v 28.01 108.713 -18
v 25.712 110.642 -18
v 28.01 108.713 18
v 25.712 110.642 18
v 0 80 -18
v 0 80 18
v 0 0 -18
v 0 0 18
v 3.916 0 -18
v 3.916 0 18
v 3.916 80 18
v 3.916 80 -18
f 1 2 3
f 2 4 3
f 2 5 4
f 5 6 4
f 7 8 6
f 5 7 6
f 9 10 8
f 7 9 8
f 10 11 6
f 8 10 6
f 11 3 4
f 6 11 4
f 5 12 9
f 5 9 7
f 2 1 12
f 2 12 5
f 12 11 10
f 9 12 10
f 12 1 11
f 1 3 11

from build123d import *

# Parameters (mm, degrees)
BOSS_EXTRU_1_DEPTH      = 18
BOSS_EXTRU_1_DEPTH_BACK = 18


with BuildPart() as part:
    # Esquisse1 → Boss.-Extru.1 (new, two sides: drawn at the far end of the back side and taken through both)
    with BuildSketch(Plane.XY.offset(-BOSS_EXTRU_1_DEPTH_BACK)):
        Polygon((0, 0), (0, 80), (25.711504387, 110.641777725), (28.009637717, 108.713414896), (3.916221868, 80), (3.916221868, 0), align=None)
    extrude(amount=BOSS_EXTRU_1_DEPTH + BOSS_EXTRU_1_DEPTH_BACK)


solid = part.part
